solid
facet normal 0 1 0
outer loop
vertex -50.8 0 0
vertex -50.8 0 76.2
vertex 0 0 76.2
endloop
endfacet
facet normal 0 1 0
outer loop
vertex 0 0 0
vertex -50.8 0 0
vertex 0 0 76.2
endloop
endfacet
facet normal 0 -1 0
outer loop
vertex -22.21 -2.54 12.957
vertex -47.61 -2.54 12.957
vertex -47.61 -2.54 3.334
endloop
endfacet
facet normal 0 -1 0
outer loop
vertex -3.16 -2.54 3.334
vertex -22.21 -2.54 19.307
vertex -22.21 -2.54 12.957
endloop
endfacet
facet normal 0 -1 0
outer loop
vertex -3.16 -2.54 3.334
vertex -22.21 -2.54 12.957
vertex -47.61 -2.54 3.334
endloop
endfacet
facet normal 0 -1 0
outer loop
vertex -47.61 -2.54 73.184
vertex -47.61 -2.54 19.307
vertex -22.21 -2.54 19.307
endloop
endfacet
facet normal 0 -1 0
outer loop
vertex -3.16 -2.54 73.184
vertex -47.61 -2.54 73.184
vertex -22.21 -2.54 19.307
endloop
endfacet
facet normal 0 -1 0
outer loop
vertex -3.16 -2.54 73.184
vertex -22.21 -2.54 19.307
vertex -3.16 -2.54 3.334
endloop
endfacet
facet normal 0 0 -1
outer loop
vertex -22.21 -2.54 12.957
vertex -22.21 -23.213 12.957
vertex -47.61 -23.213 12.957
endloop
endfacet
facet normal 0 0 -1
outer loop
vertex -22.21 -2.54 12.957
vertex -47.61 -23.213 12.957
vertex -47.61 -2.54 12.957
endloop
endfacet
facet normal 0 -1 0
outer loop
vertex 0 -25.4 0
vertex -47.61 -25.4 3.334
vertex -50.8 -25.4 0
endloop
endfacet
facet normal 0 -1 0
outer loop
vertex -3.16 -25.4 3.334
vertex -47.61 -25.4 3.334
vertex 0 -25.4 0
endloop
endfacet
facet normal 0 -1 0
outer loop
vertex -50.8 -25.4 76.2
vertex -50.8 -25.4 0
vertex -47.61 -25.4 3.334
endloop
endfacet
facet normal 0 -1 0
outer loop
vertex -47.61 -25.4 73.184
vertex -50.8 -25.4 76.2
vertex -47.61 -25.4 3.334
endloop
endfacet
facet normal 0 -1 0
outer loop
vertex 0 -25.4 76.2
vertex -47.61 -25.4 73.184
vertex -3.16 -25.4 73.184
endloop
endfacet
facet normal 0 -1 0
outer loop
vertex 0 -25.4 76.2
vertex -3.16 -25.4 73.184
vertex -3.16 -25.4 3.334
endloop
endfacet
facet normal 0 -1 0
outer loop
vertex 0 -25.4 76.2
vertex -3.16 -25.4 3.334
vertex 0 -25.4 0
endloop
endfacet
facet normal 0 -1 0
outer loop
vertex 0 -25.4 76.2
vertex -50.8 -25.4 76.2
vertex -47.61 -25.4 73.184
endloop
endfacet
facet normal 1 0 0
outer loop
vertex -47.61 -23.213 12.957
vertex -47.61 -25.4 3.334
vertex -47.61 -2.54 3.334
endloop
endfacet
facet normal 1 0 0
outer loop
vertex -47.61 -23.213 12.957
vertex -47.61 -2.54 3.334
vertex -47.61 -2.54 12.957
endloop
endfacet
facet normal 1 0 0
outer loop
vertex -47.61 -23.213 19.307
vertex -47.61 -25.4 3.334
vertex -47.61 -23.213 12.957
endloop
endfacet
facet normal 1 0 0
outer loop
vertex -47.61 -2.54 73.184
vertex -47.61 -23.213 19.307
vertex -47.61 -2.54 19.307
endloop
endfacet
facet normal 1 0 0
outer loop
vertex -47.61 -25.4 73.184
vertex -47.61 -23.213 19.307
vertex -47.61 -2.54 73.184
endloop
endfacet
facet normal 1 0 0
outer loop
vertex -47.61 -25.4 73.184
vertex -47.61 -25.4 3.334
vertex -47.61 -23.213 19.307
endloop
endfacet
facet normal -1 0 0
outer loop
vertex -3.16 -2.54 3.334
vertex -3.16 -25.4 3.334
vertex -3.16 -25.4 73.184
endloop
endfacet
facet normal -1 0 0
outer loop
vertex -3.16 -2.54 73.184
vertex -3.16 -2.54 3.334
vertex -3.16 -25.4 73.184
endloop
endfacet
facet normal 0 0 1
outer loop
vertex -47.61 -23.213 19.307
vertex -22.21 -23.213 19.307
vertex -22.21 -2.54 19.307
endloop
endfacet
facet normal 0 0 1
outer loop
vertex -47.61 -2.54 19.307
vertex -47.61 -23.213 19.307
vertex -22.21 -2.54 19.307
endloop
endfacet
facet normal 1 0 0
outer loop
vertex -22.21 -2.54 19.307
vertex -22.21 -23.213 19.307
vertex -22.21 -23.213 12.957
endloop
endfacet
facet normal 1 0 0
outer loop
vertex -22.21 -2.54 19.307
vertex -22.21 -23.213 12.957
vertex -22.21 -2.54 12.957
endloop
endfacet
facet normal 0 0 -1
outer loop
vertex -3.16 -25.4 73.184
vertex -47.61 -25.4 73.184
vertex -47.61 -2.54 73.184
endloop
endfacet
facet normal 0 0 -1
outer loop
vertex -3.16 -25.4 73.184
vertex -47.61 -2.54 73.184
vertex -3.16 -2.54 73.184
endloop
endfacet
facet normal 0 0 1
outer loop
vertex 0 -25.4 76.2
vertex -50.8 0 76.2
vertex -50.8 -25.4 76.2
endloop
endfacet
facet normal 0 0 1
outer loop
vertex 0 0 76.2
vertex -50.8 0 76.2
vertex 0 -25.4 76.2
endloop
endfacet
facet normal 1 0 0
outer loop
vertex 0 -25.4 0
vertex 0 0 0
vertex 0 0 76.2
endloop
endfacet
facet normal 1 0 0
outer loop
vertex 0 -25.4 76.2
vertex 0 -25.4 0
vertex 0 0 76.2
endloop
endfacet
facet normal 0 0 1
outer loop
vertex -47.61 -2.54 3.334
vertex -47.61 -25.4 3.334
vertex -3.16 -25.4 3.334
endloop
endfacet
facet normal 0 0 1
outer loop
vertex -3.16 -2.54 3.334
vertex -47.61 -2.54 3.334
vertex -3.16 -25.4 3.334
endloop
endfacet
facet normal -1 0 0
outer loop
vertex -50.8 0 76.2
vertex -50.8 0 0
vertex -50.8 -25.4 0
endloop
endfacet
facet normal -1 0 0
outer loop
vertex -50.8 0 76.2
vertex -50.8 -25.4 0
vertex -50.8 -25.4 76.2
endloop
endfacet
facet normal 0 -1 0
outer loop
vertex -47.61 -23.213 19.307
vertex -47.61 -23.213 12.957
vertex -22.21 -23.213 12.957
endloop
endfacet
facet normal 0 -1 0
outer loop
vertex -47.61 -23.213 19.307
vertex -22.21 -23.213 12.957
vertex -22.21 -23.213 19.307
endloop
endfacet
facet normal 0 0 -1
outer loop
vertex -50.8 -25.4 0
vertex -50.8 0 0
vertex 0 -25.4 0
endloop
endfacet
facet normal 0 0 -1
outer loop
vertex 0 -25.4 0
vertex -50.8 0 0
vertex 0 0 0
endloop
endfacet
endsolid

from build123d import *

# Parameters (mm, degrees)
F0_W     = 50.8
F0_H     = 76.2
F1_DEPTH = 25.4
F2_W     = 44.45
F2_H     = 69.85
F3_DEPTH = 22.86
F4_W     = 22.86
F4_H     = 6.35
F5_DEPTH = 25.4


with BuildPart() as f1:
    # F0 (on Front) → F1 (new body)
    with BuildSketch(Plane.XZ):
        with Locations((-25.4, 38.1)):
            Rectangle(F0_W, F0_H)
    extrude(amount=F1_DEPTH)

    # F2 (on face) → F3 (cut)
    with BuildSketch(Plane.XZ.offset(25.4)):
        with Locations((-25.384539, 38.258707)):
            Rectangle(F2_W, F2_H)
    extrude(amount=-F3_DEPTH, mode=Mode.SUBTRACT)

    # F4 (on face) → F5 (join)
    with BuildSketch(Plane.YZ.offset(-47.609539)):
        with Locations((-11.782601, 16.132223)):
            Rectangle(F4_W, F4_H)
    extrude(amount=F5_DEPTH)


solid = f1.part
